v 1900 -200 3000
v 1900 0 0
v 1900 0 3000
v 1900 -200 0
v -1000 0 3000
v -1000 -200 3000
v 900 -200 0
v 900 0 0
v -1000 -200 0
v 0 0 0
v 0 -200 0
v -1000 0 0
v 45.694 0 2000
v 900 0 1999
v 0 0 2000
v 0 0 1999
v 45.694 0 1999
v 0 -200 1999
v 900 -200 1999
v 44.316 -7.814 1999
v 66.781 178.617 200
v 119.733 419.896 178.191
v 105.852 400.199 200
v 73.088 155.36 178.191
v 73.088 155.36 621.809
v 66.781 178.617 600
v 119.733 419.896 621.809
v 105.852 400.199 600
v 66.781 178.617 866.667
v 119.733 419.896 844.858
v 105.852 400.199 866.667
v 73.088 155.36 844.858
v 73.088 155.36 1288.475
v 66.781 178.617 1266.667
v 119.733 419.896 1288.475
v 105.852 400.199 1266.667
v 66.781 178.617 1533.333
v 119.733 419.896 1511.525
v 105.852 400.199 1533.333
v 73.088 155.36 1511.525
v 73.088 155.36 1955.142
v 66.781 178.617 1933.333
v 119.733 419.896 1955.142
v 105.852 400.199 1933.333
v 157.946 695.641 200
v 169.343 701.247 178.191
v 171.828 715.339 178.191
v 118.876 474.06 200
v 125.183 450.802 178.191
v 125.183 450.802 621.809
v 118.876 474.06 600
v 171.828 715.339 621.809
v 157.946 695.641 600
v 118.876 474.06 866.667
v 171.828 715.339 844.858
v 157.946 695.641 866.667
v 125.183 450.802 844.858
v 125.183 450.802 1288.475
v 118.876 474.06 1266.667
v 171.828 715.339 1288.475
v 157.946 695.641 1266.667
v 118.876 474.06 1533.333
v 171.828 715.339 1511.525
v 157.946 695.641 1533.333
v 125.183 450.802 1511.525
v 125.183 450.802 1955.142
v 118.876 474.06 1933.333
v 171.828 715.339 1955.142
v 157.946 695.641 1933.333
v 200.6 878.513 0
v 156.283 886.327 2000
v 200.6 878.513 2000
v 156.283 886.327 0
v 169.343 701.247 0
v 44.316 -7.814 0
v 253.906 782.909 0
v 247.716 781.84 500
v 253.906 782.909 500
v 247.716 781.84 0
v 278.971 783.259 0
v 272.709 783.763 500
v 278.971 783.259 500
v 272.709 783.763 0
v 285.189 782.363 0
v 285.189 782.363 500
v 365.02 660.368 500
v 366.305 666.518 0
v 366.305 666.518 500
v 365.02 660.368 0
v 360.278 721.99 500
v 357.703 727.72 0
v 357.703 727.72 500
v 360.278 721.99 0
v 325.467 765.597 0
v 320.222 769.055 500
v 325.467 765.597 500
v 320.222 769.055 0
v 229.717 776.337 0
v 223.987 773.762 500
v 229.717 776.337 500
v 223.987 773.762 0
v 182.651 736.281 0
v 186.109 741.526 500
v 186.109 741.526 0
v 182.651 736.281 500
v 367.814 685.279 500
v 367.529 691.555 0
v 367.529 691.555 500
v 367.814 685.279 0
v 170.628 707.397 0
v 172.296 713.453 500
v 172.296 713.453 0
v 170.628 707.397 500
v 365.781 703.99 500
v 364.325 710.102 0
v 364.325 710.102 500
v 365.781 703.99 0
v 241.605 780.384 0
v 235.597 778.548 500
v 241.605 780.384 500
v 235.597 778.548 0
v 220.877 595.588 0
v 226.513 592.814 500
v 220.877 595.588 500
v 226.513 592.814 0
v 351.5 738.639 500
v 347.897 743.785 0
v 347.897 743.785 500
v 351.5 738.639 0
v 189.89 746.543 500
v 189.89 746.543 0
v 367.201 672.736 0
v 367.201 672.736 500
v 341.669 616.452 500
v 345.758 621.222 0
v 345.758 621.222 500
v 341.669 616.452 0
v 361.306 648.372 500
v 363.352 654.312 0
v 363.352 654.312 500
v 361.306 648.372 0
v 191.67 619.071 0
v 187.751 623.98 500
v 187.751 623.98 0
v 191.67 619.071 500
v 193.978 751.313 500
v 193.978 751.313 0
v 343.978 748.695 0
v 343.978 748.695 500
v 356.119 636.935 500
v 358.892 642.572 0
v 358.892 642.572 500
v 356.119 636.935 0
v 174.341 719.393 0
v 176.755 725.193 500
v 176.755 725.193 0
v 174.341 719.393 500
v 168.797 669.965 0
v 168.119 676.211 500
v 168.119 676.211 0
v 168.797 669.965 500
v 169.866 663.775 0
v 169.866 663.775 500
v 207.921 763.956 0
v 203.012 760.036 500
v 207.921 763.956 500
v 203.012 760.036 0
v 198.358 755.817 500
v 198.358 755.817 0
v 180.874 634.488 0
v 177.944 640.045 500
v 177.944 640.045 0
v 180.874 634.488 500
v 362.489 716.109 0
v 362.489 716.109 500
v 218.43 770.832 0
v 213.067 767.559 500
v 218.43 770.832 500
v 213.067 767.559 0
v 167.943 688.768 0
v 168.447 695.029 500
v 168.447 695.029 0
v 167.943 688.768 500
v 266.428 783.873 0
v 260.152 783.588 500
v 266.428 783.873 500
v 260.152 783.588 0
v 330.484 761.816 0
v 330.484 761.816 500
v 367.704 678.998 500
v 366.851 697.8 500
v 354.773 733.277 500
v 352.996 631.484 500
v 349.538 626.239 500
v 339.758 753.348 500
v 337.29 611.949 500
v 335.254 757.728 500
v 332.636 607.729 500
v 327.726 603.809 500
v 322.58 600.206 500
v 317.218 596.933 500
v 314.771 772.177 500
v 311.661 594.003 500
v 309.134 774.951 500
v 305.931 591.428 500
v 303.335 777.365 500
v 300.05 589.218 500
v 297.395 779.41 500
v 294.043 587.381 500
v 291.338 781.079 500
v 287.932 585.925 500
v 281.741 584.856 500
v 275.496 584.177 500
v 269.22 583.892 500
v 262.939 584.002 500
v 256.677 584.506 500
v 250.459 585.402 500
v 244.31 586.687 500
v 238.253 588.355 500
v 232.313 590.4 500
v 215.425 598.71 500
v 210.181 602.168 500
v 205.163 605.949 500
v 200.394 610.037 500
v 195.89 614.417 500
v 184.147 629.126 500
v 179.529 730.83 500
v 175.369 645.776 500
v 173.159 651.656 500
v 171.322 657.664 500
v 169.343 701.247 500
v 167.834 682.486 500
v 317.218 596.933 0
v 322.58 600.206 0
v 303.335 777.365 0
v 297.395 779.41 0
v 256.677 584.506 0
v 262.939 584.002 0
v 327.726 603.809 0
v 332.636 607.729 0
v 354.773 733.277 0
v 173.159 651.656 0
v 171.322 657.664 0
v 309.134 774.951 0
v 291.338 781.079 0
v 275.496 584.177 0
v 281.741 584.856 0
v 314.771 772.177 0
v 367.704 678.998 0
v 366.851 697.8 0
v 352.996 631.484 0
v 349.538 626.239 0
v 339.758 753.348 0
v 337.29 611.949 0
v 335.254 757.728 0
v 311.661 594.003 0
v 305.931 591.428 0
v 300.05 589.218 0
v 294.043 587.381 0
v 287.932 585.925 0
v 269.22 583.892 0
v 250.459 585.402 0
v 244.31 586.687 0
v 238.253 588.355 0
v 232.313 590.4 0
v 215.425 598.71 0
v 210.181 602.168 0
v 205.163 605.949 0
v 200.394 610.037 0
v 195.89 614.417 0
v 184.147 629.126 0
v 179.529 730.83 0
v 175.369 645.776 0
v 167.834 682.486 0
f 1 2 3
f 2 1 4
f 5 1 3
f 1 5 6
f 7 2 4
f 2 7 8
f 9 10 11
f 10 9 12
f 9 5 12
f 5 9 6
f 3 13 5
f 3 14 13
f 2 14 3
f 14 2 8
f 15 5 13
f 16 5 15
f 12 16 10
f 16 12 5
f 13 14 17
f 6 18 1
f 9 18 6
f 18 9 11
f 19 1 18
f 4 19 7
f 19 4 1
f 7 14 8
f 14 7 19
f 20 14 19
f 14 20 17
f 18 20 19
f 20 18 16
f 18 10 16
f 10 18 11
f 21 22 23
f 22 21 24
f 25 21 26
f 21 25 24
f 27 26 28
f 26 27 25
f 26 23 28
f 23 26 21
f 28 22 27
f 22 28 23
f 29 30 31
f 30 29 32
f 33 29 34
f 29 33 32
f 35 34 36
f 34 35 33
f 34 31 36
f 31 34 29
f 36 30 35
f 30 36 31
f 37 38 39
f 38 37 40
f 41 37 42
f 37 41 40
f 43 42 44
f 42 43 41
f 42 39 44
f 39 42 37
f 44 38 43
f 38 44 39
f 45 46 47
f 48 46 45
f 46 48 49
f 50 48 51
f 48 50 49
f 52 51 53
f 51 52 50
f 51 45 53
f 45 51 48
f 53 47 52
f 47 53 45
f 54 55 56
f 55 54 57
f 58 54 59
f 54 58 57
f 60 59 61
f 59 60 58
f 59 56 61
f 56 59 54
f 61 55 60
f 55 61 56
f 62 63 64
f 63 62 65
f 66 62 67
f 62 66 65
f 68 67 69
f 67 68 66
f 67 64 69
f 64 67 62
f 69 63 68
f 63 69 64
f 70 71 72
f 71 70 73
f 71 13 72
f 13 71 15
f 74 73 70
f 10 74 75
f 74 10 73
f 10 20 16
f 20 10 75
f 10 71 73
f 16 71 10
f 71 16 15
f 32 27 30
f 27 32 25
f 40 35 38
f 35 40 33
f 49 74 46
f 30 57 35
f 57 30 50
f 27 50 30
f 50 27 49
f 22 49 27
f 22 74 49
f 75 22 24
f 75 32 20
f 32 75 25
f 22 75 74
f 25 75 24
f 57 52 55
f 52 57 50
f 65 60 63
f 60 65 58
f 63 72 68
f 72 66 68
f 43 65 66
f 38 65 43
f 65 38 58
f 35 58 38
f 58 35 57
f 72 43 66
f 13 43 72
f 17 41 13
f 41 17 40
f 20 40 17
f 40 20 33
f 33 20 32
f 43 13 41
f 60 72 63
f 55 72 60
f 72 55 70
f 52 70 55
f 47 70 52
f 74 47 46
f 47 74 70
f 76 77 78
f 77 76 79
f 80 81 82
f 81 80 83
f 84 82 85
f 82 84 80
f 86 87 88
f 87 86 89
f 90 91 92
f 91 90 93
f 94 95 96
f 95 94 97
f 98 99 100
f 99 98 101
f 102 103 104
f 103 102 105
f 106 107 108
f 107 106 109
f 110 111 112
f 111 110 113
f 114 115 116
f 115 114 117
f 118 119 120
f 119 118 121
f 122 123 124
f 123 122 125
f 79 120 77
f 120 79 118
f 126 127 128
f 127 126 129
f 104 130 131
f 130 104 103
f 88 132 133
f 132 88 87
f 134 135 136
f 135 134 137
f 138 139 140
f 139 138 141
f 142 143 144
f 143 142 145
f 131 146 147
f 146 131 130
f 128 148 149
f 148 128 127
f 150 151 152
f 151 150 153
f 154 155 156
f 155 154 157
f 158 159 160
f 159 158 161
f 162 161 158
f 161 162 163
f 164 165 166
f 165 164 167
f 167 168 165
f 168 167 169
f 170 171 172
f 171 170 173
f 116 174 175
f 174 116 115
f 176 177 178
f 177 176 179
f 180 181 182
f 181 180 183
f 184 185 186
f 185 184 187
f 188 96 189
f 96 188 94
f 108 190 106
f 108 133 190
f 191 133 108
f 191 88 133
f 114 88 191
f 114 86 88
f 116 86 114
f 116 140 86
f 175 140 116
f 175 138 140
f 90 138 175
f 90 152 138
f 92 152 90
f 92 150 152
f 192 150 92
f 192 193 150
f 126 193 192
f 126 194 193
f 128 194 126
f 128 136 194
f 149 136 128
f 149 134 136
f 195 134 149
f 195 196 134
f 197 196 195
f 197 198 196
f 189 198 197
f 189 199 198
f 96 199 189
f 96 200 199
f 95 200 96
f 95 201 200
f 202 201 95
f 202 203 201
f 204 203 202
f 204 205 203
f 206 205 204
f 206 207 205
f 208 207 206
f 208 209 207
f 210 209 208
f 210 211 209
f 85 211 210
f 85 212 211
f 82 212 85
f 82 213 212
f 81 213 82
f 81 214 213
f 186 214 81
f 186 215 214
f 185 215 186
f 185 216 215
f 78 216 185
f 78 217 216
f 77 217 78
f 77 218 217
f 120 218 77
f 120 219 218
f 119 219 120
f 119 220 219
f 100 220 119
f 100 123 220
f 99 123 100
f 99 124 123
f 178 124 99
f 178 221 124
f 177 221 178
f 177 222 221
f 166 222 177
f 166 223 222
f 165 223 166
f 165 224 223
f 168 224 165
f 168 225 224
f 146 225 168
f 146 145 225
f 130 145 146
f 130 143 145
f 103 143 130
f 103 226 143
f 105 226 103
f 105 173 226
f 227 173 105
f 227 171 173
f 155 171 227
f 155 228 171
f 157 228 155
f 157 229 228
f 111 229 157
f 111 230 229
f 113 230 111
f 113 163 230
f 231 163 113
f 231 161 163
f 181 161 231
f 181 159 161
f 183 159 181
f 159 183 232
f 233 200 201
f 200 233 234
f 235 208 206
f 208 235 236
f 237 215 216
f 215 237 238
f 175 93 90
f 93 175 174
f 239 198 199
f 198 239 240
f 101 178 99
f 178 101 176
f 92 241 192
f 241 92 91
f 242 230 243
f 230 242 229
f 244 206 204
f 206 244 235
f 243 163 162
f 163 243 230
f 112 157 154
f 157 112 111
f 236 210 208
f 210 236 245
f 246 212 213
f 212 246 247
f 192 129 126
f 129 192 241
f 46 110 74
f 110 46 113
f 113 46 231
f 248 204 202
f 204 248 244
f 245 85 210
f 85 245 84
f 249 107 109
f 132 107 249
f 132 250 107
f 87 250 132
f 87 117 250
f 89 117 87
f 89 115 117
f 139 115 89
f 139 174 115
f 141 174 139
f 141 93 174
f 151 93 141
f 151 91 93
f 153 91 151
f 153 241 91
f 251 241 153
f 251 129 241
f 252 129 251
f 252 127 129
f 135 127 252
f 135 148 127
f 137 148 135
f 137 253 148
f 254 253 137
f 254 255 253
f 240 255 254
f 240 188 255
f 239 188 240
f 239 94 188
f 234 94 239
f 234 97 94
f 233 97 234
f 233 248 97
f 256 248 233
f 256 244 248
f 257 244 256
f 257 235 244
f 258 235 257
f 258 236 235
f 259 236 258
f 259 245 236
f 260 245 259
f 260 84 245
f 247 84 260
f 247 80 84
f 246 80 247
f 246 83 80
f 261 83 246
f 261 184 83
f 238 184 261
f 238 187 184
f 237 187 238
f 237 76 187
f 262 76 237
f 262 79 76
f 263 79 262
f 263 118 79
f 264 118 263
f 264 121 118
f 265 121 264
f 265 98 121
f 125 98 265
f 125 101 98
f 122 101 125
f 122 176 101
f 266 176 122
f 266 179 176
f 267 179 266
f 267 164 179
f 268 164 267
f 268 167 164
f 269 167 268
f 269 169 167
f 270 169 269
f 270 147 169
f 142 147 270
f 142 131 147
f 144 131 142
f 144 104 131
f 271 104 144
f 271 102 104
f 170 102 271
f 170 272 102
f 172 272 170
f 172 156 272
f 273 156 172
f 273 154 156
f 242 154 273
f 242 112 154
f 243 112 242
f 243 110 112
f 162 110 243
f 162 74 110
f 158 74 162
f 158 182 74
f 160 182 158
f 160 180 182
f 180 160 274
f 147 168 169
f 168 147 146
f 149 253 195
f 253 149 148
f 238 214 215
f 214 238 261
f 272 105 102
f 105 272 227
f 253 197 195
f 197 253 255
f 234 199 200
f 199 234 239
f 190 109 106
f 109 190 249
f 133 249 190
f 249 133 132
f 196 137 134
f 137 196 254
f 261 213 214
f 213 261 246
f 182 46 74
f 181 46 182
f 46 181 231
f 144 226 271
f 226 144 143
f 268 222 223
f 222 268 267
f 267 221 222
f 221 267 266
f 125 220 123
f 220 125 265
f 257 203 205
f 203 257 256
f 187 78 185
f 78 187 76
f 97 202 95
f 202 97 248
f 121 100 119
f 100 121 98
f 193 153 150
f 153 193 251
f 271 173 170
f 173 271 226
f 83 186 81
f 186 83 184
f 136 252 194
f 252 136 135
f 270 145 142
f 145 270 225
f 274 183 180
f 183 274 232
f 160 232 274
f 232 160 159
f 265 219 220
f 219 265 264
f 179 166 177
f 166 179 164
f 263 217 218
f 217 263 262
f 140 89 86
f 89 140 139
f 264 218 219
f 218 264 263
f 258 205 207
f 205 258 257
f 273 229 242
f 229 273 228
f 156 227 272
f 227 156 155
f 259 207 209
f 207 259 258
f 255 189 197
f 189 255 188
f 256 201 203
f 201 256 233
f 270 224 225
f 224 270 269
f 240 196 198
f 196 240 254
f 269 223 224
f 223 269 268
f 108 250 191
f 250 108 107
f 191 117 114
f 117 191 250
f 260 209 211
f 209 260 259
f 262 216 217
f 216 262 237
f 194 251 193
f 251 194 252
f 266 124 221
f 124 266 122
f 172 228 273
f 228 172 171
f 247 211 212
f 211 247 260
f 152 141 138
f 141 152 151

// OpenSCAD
// Door images

h=2000;
w=900;
t=45;
mode="PROPPED";

wall=200;
$fn=100;

module prop()
{
    translate([w*.8,-t-100,0])
    cylinder(r=100,h=h/4);
}

module tamper()
{
    translate([w*0.8,-t-20,h/2])
    {
        rotate([10,70,0])
        cylinder(r=20,h=w*0.2);
    }
}

module force()
{
    translate([w*0.8,-t-20,h/2-200])
    rotate([90,0,0])
    cylinder(r=100,h=300);
}

module bolt(x=0,y=h/2)
{
    translate([w*0.8-x,-t-20,y])
    {
        rotate([0,90,0])
        cylinder(r=20,h=w*0.2);
    }
}

module padlock(x=0,y=h/2)
{
    translate([w*0.85-x,-t-25,y-130])
    {
        scale([1,0.5,1])
        cylinder(r=50,h=100);
    }
}

module lock(y=h/2)
{
    bolt(0,y);
    padlock(0,y);
}

module unlock(y=h/2)
{
    bolt(20,y);
}

module door(a=0)
{
    rotate([0,0,a])
    {
        difference()
        {
            translate([0,-t,0])
            cube([w,t,h]);
            for(x=[w/3,2*w/3])
            for(y=[h/5,h/5+h/3,h/5+2*h/3])
            translate([x,-t-1,y])
            hull()
            {
                cube([w/4,t/2,h/5],true);
                translate([0,-1,0])
                cube([w/4+50,1,h/5+50],true);
            }
        }
        if(mode=="PROPPED")prop();
        if(mode=="LOCKING"){padlock();unlock();}
        if(mode=="UNLOCKED")unlock();
        if(mode=="UNLOCKING"){padlock();unlock();}
        if(mode=="LOCKED")lock();
        if(mode=="DEADLOCKED"){lock(h/5);lock();lock(4*h/5);}
        if(mode=="FORCED"){lock();force();}
        if(mode=="TAMPER")tamper();
    }
    if(mode=="UNUSED")
    {
        translate([w/2,-wall-t/2,h/2])
        {
            rotate([0,30,0])
            cube([w*1.5,t,w*0.2],true);
            rotate([0,-25,0])
            cube([w*1.5,t,w*0.2],true);
        }
    }
}

module frame()
{
    difference()
    {
        translate([-1000,-wall,0])
        cube([w+2000,wall,h+1000]);
        translate([0,-wall-1,-1])
        cube([w,wall+2,h]);
    }
}

frame();
if(mode=="UNUSED")door(-1);
if(mode=="NEW")door(-10);
//if(mode=="OFFLINE")door(-1);
if(mode=="DEADLOCKED")door(-1);
if(mode=="LOCKING")door(-1);
if(mode=="LOCKED")door(4);
if(mode=="UNLOCKING")door(5);
if(mode=="UNLOCKED")door(-1);
if(mode=="OPEN")door(70);
if(mode=="CLOSED")door(-1);
if(mode=="LOCKING")door(-1);
if(mode=="PROPPED")door(80);
if(mode=="NOTCLOSED")door(50);
if(mode=="AJAR")door(10);
if(mode=="FAULT")rotate([-30,-10,0])door(10);
if(mode=="TAMPER")door(-1);
if(mode=="FORCED")door(50);
